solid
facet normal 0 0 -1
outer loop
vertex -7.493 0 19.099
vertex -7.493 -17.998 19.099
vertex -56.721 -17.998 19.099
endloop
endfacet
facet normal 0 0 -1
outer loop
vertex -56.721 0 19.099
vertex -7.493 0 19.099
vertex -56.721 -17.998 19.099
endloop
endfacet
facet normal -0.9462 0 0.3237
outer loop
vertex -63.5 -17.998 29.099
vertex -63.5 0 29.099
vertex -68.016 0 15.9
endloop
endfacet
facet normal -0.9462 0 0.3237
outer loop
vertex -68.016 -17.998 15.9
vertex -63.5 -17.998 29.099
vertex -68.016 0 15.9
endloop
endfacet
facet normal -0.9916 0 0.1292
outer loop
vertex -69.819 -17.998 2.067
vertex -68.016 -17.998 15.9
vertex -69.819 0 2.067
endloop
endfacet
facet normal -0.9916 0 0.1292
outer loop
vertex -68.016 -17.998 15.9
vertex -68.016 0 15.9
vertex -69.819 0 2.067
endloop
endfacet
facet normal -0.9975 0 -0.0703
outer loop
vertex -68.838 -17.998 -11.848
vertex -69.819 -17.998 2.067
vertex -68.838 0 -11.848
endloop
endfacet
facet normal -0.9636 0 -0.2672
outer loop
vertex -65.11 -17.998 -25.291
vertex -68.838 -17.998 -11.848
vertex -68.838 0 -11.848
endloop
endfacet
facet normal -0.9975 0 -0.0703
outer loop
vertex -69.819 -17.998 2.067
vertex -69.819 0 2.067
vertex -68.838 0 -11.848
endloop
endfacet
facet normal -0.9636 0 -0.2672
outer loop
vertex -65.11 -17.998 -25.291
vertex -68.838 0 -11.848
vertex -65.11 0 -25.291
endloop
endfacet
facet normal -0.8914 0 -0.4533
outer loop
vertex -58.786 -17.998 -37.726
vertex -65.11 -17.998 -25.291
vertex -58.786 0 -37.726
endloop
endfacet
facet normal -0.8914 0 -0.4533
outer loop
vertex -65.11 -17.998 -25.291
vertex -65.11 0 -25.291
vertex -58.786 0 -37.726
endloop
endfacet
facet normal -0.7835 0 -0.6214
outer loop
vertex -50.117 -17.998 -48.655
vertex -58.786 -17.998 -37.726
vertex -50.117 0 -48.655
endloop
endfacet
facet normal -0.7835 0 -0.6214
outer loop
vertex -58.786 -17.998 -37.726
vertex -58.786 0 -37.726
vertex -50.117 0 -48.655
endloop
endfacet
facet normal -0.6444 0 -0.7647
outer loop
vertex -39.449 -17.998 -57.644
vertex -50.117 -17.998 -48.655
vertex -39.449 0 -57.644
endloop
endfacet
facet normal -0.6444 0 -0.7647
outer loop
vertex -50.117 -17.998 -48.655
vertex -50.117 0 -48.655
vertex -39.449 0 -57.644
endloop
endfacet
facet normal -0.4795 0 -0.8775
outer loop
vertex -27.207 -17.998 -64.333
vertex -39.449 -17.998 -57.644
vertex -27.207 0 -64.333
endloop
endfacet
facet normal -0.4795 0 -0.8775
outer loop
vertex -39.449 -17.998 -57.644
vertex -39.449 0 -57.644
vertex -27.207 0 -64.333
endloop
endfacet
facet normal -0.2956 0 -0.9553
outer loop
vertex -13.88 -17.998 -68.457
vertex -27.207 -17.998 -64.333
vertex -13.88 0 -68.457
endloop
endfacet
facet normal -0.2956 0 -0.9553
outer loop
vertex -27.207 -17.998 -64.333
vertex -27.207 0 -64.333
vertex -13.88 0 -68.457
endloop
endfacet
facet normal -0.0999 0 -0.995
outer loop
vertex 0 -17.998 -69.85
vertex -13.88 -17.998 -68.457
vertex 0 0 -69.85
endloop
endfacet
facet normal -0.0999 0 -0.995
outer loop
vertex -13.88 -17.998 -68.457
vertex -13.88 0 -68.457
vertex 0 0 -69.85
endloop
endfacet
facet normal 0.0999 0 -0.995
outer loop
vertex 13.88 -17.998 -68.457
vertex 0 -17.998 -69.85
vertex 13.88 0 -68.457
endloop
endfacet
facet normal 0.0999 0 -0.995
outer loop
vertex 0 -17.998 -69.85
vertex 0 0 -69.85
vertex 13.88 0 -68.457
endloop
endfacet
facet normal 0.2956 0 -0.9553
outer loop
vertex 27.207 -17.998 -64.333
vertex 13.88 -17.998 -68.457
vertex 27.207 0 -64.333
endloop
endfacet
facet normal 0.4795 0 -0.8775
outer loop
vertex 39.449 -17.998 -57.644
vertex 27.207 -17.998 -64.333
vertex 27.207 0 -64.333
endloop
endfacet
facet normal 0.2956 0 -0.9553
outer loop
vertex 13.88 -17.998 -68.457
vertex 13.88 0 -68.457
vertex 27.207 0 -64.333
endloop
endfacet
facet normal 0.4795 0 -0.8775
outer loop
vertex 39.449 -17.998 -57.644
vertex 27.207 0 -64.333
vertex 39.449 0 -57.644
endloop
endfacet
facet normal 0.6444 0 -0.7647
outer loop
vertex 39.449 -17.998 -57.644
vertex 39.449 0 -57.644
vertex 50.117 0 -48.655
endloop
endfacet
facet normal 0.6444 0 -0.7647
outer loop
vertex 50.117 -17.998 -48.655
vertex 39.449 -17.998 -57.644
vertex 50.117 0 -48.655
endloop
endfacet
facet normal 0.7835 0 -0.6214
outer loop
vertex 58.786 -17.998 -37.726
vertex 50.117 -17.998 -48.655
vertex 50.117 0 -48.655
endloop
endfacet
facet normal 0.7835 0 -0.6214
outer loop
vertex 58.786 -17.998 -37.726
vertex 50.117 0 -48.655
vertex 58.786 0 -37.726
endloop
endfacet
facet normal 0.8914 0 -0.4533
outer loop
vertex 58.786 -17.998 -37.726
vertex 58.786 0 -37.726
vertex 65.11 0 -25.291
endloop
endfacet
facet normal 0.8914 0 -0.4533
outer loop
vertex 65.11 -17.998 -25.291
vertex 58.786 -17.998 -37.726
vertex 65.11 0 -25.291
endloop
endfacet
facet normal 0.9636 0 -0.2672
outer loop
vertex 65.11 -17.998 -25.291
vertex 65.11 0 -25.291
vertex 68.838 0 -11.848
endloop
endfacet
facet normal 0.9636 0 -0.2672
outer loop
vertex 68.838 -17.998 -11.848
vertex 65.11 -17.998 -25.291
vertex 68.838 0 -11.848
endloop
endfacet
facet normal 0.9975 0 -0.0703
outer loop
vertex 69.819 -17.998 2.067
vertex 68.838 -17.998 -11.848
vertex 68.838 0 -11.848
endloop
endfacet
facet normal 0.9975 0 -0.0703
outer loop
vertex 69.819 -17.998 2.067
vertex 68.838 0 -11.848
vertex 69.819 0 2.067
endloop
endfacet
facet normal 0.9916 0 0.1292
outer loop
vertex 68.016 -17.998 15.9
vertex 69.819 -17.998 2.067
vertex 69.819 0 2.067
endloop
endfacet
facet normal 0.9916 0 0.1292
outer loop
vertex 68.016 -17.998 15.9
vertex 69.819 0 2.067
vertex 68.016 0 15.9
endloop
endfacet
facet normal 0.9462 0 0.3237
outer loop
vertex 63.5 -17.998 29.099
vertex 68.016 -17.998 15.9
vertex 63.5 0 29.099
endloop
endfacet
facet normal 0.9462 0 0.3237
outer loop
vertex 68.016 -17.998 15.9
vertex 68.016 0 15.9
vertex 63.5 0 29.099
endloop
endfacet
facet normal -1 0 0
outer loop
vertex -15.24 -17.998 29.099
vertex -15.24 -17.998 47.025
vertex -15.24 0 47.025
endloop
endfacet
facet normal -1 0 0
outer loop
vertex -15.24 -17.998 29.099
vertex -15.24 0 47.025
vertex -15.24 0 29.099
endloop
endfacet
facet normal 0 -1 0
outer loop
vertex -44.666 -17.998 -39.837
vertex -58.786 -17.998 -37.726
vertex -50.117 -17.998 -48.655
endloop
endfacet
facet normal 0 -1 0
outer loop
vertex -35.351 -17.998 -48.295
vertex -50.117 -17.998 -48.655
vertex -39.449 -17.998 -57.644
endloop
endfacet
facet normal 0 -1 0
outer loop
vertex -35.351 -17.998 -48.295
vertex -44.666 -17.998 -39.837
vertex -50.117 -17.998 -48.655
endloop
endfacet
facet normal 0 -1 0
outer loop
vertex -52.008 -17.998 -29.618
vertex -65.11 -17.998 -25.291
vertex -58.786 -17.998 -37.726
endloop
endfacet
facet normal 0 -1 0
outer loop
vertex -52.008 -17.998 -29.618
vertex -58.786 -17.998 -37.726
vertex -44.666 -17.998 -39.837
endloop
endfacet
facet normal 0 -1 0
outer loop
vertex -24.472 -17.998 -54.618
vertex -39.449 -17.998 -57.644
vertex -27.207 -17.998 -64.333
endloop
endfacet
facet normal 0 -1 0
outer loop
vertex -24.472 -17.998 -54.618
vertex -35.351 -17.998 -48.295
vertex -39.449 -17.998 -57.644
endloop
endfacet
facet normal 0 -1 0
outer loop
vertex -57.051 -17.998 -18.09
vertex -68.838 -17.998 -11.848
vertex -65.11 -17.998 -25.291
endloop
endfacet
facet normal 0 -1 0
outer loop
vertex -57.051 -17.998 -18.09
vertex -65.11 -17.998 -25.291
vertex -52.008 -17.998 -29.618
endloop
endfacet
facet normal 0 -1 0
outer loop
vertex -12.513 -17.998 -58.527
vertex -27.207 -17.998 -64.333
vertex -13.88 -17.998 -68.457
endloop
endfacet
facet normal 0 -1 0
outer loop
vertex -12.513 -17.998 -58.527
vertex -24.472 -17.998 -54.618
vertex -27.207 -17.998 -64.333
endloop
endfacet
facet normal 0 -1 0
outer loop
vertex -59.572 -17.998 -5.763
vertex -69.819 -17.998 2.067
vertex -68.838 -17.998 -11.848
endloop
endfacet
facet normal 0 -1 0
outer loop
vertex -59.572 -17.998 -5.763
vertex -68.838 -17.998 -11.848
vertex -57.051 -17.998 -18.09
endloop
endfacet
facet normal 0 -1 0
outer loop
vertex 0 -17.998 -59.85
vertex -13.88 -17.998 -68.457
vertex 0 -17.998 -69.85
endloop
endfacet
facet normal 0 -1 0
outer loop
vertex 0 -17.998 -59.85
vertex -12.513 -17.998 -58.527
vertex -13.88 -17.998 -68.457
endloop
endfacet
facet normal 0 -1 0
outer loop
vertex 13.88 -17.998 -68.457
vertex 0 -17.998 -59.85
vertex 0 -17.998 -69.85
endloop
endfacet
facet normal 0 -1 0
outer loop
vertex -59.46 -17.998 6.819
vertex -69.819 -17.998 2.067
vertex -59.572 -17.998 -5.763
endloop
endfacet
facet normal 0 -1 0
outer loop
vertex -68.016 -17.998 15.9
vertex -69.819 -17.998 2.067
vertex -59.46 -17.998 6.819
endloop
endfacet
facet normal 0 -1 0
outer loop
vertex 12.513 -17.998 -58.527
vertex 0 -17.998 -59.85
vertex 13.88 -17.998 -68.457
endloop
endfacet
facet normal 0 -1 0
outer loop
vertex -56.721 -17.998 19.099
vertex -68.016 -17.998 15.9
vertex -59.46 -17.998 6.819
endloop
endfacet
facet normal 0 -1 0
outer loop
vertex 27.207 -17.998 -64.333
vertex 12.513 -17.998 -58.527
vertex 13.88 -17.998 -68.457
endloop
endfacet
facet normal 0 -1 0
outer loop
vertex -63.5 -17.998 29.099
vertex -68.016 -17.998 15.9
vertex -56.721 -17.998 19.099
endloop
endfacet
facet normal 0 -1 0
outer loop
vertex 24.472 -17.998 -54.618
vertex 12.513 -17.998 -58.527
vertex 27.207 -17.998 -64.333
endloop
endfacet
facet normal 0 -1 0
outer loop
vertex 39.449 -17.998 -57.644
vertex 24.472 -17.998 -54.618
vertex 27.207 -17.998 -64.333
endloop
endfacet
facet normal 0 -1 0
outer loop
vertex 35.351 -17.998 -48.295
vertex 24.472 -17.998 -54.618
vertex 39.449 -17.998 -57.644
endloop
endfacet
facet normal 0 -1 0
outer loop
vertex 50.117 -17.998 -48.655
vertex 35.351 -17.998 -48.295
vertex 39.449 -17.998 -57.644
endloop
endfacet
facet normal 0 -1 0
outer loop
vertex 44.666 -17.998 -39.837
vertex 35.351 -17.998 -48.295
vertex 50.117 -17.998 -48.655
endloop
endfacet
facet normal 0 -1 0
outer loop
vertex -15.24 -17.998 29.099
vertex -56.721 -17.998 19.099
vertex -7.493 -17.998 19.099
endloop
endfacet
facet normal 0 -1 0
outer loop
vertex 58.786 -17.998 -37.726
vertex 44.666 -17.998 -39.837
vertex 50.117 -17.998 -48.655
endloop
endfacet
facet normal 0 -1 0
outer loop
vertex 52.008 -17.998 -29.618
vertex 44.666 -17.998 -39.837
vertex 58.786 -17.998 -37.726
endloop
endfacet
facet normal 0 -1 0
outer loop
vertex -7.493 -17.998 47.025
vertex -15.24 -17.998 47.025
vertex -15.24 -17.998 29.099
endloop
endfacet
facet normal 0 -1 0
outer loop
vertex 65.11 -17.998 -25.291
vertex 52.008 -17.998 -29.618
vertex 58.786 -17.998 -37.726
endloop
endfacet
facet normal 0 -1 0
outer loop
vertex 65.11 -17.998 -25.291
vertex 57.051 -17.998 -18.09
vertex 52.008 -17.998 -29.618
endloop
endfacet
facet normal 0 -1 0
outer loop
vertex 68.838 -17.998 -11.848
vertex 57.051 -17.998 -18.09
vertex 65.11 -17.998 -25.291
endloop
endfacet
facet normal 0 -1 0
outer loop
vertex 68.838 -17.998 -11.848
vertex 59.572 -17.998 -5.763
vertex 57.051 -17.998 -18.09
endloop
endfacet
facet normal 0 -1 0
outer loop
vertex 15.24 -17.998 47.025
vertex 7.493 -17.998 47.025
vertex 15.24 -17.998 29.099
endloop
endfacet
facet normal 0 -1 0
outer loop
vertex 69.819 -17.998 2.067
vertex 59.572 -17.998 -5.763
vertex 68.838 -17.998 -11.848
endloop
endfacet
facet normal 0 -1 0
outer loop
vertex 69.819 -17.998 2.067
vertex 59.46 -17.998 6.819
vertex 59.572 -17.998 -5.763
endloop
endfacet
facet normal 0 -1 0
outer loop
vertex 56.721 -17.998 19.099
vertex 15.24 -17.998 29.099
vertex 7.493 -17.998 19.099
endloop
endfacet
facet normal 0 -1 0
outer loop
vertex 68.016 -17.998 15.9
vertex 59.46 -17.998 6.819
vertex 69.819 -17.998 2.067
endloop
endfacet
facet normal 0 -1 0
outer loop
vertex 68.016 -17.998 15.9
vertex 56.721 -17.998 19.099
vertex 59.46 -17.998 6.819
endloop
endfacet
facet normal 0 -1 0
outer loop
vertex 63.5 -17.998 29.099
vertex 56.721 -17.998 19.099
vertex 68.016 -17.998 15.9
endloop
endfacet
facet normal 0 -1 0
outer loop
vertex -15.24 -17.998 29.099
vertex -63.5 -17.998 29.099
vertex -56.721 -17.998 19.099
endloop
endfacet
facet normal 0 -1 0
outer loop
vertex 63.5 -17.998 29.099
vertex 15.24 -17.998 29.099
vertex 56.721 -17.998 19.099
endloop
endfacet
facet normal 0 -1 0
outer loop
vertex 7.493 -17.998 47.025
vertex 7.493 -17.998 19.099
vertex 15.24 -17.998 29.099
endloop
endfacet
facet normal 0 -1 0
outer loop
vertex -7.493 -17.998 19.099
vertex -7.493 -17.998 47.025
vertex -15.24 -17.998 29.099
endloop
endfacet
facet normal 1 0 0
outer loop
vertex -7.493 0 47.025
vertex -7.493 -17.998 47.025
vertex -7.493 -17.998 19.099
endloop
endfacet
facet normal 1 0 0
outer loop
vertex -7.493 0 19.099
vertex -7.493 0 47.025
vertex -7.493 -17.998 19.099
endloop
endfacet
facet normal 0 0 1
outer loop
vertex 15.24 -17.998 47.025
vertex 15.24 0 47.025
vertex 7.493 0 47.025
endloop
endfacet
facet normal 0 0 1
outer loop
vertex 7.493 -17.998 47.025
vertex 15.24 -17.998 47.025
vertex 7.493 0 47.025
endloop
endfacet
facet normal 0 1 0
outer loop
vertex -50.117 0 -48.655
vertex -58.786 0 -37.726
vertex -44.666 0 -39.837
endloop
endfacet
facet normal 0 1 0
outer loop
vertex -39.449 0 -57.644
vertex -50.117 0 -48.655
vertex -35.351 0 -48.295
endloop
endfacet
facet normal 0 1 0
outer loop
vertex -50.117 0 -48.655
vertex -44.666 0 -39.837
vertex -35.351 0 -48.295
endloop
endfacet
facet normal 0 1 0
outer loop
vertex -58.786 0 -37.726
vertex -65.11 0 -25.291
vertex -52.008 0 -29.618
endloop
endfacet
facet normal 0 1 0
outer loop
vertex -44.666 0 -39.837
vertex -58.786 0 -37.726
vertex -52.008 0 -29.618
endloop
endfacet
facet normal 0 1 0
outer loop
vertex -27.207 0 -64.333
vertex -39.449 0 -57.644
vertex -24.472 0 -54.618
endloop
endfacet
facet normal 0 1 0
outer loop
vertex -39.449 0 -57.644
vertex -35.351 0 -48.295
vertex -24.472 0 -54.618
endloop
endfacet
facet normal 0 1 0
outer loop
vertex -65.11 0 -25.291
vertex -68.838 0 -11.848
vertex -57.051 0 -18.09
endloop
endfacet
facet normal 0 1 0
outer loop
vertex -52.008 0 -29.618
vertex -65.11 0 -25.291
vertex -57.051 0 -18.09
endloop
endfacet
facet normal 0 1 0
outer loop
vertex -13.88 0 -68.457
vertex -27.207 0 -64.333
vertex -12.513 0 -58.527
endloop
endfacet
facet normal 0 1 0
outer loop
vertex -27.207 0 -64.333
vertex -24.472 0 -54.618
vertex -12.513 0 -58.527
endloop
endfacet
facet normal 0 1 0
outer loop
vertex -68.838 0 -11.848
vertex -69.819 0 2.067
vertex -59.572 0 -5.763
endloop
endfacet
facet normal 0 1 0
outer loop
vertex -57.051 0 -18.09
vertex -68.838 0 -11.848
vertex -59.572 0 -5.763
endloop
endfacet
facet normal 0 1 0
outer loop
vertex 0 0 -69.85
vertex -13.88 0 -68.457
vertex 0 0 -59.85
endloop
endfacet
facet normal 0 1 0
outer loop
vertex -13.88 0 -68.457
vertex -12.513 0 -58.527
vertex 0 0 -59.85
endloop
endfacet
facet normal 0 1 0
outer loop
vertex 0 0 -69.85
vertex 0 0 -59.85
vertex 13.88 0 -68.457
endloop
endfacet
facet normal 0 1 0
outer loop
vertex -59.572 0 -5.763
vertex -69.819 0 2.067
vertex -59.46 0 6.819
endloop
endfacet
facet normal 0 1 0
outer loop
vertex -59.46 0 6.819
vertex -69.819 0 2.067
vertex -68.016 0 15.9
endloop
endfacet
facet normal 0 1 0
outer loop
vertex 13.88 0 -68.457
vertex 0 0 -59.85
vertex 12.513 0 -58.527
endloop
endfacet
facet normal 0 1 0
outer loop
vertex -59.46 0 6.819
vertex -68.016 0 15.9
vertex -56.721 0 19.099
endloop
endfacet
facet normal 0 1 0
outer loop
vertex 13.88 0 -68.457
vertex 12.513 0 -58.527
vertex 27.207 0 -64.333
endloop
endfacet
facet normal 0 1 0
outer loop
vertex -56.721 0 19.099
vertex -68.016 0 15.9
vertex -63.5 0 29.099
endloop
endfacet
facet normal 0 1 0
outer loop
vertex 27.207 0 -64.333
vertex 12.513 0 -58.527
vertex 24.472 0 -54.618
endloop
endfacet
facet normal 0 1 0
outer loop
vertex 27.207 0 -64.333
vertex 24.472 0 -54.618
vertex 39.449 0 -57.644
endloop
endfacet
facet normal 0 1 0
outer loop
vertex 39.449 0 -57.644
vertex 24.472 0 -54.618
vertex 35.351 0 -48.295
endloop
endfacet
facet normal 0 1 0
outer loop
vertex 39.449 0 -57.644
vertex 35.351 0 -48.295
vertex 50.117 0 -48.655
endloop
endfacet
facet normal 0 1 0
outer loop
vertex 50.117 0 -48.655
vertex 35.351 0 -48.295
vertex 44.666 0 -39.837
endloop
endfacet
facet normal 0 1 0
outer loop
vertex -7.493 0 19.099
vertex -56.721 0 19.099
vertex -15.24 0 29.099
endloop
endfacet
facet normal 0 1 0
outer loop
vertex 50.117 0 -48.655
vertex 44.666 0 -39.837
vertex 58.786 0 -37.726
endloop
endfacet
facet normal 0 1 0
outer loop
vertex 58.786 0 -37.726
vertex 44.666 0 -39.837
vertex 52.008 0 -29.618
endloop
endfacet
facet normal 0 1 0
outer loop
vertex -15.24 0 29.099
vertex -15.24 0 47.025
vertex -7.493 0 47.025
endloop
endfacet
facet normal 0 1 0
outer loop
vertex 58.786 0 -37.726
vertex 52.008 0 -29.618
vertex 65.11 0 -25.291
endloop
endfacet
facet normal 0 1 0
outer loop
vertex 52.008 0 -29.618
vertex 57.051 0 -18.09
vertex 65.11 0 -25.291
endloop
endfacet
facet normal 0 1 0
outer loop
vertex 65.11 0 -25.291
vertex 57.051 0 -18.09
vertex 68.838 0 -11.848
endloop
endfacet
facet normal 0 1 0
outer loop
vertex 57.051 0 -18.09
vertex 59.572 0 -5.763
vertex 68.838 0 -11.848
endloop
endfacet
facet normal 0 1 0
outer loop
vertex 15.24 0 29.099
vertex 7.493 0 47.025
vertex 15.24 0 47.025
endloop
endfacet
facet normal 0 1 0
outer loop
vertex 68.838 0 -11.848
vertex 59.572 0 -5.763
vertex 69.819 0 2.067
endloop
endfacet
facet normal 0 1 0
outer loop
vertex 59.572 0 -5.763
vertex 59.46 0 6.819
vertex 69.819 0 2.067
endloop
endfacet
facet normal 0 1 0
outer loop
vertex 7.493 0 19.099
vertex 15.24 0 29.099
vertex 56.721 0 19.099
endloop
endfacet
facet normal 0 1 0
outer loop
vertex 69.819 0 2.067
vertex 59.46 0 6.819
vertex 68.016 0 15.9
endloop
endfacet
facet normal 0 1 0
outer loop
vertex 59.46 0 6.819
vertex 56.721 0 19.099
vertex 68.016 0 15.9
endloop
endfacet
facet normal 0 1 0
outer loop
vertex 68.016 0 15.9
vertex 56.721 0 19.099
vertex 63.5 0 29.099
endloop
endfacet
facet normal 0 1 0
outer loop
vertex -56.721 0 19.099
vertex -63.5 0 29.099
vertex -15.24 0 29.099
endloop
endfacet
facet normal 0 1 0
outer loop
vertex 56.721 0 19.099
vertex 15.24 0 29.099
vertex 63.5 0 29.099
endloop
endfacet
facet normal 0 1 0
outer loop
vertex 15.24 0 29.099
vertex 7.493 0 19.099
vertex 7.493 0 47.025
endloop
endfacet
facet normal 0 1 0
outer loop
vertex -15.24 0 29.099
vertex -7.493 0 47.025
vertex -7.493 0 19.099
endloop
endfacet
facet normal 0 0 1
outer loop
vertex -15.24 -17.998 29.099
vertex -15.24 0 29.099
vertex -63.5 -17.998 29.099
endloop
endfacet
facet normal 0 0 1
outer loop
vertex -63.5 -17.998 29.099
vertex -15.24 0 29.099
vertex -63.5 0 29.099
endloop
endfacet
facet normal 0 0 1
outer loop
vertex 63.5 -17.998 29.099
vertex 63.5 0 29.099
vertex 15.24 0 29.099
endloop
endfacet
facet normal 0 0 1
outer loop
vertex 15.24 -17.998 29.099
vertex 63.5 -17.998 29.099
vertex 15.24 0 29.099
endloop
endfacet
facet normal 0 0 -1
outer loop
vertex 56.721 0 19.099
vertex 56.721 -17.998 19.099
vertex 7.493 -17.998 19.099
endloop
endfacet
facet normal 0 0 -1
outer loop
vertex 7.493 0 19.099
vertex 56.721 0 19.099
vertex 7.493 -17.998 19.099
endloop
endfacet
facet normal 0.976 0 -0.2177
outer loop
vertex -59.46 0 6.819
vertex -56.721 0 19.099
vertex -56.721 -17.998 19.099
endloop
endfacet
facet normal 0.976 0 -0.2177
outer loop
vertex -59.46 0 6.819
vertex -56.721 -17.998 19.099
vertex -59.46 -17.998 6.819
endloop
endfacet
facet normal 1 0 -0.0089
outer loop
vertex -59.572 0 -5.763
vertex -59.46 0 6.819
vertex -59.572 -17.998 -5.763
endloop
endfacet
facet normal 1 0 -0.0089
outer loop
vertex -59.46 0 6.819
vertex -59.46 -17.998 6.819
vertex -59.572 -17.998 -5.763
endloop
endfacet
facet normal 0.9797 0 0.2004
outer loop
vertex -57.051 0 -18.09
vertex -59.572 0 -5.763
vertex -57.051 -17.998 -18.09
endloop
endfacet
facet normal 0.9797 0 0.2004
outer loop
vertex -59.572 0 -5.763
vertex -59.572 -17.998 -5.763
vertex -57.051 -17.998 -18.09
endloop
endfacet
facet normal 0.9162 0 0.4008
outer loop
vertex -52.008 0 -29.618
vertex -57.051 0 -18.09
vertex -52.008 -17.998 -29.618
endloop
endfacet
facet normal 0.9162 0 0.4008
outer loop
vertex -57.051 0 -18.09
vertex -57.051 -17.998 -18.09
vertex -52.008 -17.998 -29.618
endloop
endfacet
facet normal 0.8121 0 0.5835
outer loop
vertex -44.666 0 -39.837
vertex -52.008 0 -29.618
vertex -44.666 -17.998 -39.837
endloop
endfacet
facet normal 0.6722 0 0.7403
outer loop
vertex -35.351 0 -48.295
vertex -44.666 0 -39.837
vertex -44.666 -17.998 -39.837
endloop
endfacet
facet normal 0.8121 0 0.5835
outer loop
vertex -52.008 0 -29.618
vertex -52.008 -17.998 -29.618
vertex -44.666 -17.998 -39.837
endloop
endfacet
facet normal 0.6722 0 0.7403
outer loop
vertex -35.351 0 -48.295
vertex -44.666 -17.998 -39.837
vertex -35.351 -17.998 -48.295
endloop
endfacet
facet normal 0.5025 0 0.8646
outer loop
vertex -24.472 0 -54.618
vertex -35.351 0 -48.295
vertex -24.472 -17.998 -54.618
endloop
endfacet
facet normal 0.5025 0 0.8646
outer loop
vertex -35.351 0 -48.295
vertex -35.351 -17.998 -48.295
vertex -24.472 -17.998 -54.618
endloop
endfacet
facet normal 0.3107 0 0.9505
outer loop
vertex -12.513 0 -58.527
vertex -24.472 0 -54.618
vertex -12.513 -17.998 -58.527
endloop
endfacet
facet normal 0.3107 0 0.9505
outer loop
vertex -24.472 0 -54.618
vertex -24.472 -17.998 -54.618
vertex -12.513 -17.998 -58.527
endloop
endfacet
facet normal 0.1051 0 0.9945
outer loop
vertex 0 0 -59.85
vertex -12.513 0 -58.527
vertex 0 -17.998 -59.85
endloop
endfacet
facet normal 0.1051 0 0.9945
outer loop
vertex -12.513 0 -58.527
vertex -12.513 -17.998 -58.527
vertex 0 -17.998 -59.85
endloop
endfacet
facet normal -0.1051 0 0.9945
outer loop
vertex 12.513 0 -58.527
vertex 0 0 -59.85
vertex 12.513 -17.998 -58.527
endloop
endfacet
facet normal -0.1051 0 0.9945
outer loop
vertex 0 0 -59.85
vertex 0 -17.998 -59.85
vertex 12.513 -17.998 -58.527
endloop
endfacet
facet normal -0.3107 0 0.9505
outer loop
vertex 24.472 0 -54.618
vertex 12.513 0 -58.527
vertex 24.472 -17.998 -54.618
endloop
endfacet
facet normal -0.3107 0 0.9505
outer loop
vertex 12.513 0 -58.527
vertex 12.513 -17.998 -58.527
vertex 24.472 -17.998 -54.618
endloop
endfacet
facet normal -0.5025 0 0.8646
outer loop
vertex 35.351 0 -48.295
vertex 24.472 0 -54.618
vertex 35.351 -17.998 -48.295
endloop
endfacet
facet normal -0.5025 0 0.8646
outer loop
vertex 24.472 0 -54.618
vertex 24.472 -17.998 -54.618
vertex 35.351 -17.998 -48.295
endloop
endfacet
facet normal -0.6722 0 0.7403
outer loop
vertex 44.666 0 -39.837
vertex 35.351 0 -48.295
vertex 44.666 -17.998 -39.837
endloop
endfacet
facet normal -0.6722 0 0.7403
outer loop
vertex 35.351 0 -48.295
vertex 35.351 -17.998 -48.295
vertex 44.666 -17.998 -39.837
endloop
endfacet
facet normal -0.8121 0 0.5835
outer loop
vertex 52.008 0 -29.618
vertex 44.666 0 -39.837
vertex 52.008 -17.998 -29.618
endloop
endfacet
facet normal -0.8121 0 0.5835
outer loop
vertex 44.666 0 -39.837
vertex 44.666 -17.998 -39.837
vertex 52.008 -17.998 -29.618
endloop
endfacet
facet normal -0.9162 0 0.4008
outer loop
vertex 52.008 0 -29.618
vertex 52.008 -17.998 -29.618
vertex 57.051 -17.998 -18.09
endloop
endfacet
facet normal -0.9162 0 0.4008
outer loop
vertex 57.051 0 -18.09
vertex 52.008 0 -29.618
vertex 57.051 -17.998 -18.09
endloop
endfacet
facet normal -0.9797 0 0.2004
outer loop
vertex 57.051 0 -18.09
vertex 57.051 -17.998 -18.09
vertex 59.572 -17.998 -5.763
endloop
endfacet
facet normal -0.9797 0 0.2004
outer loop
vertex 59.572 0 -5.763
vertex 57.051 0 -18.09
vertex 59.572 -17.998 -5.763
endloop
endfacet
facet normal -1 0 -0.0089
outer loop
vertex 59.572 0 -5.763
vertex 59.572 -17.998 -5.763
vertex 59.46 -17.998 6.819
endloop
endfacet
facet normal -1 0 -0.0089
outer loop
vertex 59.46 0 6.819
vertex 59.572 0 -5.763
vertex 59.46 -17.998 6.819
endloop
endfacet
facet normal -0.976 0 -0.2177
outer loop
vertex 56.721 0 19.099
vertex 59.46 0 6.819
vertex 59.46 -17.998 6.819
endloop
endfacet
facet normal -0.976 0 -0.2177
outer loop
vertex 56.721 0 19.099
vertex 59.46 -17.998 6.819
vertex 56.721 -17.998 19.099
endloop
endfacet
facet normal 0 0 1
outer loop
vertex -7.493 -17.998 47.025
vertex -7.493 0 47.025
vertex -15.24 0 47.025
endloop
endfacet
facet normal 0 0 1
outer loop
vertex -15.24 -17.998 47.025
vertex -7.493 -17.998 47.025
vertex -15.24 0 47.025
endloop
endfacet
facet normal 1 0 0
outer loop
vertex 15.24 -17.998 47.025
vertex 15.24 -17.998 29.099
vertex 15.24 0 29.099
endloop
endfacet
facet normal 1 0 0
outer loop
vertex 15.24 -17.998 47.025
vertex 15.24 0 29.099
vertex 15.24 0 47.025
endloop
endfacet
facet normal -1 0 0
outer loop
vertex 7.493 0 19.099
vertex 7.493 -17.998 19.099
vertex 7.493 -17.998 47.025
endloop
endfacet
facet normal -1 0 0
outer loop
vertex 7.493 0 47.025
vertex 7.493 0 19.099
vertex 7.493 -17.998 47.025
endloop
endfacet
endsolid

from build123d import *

# Parameters (mm, degrees)
F1_DEPTH = 17.99844
F3_DEPTH = 17.99944


with BuildPart() as f1:
    # F0 (on Front) → F1 (new body)
    with BuildSketch(Plane.XZ):
        with BuildLine():
            Line((-15.24, 29.099356), (-63.5, 29.099356))
            ThreePointArc((-63.5, 29.099356), (0, -69.85), (63.5, 29.099356))
            Line((63.5, 29.099356), (15.24, 29.099356))
            Line((15.24, 29.099356), (15.24, 47.024507))
            Line((15.24, 47.024507), (-15.24, 47.024507))
            Line((-15.24, 47.024507), (-15.24, 29.099356))
        make_face()
    extrude(amount=F1_DEPTH)

    # F2 (on face) → F3 (cut, through all)
    with BuildSketch(Plane.XZ.offset(17.99844)):
        with BuildLine():
            Line((-7.493, 19.099376), (-56.720708, 19.099376))
            ThreePointArc((-56.720708, 19.099376), (0, -59.85002), (56.720708, 19.099376))
            Line((56.720708, 19.099376), (7.493, 19.099376))
            Line((7.493, 19.099376), (7.493, 47.024507))
            Line((7.493, 47.024507), (-7.493, 47.024507))
            Line((-7.493, 47.024507), (-7.493, 19.099376))
        make_face()
    extrude(amount=-F3_DEPTH, mode=Mode.SUBTRACT)


solid = f1.part
